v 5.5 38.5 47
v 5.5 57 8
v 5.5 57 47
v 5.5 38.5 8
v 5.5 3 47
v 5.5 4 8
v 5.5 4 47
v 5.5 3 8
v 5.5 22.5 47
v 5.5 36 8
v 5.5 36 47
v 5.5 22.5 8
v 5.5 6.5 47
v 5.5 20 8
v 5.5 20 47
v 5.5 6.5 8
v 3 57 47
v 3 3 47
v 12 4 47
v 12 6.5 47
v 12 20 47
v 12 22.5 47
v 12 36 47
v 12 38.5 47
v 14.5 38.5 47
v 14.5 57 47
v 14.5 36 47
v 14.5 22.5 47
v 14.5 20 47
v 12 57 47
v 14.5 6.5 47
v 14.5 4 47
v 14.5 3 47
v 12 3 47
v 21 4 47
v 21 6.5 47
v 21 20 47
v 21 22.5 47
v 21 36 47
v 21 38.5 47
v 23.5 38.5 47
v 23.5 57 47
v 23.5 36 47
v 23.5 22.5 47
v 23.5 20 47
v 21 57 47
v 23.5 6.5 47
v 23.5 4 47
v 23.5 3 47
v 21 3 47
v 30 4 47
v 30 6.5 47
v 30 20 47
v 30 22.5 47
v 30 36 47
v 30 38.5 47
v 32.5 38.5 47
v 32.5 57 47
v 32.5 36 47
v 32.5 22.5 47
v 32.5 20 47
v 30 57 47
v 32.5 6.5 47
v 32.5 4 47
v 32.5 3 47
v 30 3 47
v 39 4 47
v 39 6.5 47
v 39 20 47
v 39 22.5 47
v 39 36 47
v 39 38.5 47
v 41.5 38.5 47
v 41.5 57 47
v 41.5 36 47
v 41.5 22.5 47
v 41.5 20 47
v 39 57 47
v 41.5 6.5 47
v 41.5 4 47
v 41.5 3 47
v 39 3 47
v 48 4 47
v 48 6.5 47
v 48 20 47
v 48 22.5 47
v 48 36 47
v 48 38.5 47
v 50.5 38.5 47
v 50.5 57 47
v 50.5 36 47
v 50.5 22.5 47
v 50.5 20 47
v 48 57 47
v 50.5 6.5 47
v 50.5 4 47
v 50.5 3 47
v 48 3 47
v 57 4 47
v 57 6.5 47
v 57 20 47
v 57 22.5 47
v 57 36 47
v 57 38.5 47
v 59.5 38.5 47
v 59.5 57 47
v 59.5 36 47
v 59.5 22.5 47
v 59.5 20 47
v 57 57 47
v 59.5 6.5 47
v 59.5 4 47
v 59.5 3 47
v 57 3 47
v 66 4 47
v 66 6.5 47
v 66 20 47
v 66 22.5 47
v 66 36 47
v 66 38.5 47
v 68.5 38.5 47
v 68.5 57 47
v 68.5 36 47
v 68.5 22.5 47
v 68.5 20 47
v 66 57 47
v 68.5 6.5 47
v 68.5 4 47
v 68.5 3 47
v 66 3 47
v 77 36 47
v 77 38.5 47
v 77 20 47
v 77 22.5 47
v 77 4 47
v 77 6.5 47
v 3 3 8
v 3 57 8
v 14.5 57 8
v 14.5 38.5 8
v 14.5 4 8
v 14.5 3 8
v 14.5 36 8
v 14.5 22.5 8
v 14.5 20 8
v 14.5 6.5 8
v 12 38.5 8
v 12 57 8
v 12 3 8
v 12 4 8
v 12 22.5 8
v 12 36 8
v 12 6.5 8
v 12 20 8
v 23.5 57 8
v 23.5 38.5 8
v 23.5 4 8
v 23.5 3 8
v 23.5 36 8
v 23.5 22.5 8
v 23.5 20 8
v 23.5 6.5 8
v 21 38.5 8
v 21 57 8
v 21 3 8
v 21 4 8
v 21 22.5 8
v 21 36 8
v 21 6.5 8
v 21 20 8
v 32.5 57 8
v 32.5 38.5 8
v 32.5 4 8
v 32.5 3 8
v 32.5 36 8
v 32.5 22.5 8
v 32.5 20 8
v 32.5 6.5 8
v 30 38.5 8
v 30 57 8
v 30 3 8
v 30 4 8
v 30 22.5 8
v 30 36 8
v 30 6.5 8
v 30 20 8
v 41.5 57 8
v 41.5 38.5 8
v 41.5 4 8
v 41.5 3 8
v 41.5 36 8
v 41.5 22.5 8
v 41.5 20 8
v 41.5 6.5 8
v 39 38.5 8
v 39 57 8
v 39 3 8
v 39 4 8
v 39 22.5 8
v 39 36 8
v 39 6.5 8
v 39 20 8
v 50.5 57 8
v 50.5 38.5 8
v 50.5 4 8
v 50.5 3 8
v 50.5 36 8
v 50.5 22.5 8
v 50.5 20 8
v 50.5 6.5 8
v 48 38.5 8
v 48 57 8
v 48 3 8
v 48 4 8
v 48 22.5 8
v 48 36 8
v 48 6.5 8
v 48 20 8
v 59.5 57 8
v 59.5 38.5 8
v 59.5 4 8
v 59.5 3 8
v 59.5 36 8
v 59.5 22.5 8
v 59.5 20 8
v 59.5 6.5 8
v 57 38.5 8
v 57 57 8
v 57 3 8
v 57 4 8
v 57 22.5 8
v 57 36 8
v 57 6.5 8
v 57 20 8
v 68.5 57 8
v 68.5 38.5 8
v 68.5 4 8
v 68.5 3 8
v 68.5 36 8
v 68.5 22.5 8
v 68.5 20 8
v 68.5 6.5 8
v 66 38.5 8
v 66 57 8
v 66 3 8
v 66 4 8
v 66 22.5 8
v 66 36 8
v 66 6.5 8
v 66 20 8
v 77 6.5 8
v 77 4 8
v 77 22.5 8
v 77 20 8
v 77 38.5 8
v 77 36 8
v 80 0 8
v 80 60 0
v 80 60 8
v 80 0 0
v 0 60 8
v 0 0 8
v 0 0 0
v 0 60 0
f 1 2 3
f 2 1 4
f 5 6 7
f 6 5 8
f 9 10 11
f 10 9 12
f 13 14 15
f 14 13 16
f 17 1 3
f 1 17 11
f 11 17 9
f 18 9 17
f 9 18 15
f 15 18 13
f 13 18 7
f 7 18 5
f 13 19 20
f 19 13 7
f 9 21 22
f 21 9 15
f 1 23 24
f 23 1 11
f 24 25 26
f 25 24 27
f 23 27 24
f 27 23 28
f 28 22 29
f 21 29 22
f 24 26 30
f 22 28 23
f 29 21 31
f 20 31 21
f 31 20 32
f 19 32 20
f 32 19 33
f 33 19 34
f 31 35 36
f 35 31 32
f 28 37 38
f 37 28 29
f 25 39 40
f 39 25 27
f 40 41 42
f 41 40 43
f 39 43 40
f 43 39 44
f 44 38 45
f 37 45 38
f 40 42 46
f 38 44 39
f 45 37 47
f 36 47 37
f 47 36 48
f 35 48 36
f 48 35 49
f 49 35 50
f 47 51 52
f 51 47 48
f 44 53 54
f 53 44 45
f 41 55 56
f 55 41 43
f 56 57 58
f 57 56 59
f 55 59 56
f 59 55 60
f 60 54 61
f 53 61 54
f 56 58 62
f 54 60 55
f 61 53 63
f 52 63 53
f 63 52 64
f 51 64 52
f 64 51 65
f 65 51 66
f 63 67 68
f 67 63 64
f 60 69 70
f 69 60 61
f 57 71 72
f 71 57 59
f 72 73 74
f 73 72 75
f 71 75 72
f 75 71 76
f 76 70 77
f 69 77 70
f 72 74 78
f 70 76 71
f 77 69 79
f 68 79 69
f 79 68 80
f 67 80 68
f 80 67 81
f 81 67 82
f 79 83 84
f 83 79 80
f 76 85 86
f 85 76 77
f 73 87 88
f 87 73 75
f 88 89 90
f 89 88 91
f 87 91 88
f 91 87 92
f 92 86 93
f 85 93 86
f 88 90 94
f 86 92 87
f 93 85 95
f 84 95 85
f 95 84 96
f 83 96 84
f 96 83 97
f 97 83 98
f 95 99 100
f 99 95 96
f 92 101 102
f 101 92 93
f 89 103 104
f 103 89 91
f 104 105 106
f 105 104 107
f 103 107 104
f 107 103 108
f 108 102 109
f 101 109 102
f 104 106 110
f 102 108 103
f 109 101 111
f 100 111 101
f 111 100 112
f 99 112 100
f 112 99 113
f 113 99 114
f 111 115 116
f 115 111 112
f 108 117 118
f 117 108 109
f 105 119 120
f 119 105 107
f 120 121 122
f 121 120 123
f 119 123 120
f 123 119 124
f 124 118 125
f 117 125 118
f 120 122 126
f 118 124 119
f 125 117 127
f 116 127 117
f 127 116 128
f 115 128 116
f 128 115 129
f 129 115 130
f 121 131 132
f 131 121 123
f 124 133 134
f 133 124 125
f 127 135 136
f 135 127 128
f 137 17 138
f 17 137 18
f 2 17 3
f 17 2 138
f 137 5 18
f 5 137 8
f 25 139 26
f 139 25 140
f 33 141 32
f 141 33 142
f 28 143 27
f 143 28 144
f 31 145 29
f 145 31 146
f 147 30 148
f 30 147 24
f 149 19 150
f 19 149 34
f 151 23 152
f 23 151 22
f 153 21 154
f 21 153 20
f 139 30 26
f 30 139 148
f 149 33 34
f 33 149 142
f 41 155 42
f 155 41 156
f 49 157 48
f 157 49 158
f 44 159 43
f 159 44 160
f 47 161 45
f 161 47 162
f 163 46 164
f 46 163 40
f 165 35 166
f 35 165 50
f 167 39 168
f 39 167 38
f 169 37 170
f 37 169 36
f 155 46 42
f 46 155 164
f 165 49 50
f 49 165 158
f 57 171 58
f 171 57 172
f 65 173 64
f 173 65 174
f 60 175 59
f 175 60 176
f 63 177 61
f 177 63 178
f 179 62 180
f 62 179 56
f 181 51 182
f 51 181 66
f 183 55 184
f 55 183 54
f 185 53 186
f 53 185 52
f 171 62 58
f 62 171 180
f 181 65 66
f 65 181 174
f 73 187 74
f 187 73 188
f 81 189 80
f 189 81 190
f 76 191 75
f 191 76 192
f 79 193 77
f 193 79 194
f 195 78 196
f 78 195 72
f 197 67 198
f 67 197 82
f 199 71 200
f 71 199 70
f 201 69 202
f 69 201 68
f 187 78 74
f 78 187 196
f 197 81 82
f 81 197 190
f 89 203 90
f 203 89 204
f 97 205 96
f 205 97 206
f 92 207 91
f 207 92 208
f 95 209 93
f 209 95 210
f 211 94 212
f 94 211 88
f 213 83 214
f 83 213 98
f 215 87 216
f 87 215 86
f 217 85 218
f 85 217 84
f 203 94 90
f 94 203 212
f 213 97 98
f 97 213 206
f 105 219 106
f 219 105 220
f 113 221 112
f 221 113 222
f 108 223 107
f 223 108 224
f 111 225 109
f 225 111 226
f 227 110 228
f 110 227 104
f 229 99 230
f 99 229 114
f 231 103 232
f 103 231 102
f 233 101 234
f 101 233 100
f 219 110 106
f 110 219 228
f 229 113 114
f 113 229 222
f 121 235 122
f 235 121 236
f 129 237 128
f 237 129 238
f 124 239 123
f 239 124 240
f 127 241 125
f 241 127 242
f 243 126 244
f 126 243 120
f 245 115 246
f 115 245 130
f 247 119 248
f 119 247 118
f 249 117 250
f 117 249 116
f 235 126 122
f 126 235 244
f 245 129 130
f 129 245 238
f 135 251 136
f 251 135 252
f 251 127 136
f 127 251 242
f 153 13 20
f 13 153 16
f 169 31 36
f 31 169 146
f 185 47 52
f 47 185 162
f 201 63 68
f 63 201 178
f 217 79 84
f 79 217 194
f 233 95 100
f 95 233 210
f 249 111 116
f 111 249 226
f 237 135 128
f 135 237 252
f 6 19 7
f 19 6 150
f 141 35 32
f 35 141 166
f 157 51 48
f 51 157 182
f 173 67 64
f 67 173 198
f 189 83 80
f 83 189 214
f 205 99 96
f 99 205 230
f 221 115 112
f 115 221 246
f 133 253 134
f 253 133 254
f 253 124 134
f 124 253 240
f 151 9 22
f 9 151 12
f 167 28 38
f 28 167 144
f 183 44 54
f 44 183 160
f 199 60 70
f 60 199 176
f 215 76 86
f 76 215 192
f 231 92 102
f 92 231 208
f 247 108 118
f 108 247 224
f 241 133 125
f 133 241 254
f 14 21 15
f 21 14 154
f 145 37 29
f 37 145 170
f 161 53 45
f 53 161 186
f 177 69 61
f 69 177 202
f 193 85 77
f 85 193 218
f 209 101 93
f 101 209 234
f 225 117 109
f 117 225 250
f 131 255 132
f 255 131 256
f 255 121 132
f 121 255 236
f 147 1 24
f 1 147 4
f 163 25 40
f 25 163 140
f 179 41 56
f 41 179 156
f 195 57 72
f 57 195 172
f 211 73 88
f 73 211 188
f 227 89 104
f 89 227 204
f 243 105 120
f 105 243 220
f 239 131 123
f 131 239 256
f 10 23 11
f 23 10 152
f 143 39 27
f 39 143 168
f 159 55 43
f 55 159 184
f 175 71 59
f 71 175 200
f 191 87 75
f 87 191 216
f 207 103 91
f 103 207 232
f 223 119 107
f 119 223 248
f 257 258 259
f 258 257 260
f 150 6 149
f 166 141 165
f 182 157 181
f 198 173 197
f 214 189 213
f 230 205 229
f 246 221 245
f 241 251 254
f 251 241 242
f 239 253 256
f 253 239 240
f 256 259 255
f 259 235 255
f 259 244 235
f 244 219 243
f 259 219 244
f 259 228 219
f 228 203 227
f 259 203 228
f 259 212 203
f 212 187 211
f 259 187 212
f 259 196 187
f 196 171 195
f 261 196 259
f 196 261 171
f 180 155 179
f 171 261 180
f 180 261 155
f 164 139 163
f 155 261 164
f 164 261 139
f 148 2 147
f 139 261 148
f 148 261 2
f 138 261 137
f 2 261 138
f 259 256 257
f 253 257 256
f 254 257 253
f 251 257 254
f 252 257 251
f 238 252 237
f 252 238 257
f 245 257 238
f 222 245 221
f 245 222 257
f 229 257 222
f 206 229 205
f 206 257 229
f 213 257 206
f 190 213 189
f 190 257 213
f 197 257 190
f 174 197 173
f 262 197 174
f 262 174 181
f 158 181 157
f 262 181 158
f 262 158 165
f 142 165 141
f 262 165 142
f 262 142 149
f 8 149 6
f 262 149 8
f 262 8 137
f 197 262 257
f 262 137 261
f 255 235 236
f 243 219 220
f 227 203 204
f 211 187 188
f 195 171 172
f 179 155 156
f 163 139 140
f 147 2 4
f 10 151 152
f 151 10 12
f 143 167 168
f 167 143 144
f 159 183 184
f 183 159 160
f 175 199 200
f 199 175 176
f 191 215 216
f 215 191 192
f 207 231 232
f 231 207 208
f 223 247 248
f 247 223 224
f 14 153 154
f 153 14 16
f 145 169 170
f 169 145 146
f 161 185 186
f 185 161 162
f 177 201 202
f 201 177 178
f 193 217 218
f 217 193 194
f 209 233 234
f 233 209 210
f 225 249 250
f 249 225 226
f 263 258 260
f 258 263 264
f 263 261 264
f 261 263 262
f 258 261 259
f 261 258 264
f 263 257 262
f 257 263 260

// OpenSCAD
$fn = 32;

// ----------------------------------------------------------------------
// Heatsink: cross fin block
// ----------------------------------------------------------------------

// --- parameters (mm) ---
base_l = 80;              // base length, X
base_w = 60;              // base width, Y
base_t = 8;               // base plate thickness
fin_h = 40;               // fin height above the base
fin_t = 2.5;              // fin thickness
edge = 3;                 // margin from the base ends
pitch = 9;                // fin pitch
rib_pitch = 16;           // cross rib pitch

n_fins = floor((base_l - 2 * edge - fin_t) / pitch) + 1;  // fin count
total_h = base_t + fin_h - 1;  // overall height
n_ribs = floor((base_w - 2 * edge) / rib_pitch);  // rib count

union() {
  cube([base_l, base_w, base_t]);
  for (i = [0 : n_fins - 1])
    translate([edge + i * pitch, edge, base_t - 1])
      cube([fin_t, base_w - 2 * edge, fin_h]);
  for (i = [0 : n_ribs - 1])
    translate([edge, edge + 1 + i * rib_pitch, base_t - 1])
      cube([base_l - 2 * edge, fin_t, fin_h]);
}
